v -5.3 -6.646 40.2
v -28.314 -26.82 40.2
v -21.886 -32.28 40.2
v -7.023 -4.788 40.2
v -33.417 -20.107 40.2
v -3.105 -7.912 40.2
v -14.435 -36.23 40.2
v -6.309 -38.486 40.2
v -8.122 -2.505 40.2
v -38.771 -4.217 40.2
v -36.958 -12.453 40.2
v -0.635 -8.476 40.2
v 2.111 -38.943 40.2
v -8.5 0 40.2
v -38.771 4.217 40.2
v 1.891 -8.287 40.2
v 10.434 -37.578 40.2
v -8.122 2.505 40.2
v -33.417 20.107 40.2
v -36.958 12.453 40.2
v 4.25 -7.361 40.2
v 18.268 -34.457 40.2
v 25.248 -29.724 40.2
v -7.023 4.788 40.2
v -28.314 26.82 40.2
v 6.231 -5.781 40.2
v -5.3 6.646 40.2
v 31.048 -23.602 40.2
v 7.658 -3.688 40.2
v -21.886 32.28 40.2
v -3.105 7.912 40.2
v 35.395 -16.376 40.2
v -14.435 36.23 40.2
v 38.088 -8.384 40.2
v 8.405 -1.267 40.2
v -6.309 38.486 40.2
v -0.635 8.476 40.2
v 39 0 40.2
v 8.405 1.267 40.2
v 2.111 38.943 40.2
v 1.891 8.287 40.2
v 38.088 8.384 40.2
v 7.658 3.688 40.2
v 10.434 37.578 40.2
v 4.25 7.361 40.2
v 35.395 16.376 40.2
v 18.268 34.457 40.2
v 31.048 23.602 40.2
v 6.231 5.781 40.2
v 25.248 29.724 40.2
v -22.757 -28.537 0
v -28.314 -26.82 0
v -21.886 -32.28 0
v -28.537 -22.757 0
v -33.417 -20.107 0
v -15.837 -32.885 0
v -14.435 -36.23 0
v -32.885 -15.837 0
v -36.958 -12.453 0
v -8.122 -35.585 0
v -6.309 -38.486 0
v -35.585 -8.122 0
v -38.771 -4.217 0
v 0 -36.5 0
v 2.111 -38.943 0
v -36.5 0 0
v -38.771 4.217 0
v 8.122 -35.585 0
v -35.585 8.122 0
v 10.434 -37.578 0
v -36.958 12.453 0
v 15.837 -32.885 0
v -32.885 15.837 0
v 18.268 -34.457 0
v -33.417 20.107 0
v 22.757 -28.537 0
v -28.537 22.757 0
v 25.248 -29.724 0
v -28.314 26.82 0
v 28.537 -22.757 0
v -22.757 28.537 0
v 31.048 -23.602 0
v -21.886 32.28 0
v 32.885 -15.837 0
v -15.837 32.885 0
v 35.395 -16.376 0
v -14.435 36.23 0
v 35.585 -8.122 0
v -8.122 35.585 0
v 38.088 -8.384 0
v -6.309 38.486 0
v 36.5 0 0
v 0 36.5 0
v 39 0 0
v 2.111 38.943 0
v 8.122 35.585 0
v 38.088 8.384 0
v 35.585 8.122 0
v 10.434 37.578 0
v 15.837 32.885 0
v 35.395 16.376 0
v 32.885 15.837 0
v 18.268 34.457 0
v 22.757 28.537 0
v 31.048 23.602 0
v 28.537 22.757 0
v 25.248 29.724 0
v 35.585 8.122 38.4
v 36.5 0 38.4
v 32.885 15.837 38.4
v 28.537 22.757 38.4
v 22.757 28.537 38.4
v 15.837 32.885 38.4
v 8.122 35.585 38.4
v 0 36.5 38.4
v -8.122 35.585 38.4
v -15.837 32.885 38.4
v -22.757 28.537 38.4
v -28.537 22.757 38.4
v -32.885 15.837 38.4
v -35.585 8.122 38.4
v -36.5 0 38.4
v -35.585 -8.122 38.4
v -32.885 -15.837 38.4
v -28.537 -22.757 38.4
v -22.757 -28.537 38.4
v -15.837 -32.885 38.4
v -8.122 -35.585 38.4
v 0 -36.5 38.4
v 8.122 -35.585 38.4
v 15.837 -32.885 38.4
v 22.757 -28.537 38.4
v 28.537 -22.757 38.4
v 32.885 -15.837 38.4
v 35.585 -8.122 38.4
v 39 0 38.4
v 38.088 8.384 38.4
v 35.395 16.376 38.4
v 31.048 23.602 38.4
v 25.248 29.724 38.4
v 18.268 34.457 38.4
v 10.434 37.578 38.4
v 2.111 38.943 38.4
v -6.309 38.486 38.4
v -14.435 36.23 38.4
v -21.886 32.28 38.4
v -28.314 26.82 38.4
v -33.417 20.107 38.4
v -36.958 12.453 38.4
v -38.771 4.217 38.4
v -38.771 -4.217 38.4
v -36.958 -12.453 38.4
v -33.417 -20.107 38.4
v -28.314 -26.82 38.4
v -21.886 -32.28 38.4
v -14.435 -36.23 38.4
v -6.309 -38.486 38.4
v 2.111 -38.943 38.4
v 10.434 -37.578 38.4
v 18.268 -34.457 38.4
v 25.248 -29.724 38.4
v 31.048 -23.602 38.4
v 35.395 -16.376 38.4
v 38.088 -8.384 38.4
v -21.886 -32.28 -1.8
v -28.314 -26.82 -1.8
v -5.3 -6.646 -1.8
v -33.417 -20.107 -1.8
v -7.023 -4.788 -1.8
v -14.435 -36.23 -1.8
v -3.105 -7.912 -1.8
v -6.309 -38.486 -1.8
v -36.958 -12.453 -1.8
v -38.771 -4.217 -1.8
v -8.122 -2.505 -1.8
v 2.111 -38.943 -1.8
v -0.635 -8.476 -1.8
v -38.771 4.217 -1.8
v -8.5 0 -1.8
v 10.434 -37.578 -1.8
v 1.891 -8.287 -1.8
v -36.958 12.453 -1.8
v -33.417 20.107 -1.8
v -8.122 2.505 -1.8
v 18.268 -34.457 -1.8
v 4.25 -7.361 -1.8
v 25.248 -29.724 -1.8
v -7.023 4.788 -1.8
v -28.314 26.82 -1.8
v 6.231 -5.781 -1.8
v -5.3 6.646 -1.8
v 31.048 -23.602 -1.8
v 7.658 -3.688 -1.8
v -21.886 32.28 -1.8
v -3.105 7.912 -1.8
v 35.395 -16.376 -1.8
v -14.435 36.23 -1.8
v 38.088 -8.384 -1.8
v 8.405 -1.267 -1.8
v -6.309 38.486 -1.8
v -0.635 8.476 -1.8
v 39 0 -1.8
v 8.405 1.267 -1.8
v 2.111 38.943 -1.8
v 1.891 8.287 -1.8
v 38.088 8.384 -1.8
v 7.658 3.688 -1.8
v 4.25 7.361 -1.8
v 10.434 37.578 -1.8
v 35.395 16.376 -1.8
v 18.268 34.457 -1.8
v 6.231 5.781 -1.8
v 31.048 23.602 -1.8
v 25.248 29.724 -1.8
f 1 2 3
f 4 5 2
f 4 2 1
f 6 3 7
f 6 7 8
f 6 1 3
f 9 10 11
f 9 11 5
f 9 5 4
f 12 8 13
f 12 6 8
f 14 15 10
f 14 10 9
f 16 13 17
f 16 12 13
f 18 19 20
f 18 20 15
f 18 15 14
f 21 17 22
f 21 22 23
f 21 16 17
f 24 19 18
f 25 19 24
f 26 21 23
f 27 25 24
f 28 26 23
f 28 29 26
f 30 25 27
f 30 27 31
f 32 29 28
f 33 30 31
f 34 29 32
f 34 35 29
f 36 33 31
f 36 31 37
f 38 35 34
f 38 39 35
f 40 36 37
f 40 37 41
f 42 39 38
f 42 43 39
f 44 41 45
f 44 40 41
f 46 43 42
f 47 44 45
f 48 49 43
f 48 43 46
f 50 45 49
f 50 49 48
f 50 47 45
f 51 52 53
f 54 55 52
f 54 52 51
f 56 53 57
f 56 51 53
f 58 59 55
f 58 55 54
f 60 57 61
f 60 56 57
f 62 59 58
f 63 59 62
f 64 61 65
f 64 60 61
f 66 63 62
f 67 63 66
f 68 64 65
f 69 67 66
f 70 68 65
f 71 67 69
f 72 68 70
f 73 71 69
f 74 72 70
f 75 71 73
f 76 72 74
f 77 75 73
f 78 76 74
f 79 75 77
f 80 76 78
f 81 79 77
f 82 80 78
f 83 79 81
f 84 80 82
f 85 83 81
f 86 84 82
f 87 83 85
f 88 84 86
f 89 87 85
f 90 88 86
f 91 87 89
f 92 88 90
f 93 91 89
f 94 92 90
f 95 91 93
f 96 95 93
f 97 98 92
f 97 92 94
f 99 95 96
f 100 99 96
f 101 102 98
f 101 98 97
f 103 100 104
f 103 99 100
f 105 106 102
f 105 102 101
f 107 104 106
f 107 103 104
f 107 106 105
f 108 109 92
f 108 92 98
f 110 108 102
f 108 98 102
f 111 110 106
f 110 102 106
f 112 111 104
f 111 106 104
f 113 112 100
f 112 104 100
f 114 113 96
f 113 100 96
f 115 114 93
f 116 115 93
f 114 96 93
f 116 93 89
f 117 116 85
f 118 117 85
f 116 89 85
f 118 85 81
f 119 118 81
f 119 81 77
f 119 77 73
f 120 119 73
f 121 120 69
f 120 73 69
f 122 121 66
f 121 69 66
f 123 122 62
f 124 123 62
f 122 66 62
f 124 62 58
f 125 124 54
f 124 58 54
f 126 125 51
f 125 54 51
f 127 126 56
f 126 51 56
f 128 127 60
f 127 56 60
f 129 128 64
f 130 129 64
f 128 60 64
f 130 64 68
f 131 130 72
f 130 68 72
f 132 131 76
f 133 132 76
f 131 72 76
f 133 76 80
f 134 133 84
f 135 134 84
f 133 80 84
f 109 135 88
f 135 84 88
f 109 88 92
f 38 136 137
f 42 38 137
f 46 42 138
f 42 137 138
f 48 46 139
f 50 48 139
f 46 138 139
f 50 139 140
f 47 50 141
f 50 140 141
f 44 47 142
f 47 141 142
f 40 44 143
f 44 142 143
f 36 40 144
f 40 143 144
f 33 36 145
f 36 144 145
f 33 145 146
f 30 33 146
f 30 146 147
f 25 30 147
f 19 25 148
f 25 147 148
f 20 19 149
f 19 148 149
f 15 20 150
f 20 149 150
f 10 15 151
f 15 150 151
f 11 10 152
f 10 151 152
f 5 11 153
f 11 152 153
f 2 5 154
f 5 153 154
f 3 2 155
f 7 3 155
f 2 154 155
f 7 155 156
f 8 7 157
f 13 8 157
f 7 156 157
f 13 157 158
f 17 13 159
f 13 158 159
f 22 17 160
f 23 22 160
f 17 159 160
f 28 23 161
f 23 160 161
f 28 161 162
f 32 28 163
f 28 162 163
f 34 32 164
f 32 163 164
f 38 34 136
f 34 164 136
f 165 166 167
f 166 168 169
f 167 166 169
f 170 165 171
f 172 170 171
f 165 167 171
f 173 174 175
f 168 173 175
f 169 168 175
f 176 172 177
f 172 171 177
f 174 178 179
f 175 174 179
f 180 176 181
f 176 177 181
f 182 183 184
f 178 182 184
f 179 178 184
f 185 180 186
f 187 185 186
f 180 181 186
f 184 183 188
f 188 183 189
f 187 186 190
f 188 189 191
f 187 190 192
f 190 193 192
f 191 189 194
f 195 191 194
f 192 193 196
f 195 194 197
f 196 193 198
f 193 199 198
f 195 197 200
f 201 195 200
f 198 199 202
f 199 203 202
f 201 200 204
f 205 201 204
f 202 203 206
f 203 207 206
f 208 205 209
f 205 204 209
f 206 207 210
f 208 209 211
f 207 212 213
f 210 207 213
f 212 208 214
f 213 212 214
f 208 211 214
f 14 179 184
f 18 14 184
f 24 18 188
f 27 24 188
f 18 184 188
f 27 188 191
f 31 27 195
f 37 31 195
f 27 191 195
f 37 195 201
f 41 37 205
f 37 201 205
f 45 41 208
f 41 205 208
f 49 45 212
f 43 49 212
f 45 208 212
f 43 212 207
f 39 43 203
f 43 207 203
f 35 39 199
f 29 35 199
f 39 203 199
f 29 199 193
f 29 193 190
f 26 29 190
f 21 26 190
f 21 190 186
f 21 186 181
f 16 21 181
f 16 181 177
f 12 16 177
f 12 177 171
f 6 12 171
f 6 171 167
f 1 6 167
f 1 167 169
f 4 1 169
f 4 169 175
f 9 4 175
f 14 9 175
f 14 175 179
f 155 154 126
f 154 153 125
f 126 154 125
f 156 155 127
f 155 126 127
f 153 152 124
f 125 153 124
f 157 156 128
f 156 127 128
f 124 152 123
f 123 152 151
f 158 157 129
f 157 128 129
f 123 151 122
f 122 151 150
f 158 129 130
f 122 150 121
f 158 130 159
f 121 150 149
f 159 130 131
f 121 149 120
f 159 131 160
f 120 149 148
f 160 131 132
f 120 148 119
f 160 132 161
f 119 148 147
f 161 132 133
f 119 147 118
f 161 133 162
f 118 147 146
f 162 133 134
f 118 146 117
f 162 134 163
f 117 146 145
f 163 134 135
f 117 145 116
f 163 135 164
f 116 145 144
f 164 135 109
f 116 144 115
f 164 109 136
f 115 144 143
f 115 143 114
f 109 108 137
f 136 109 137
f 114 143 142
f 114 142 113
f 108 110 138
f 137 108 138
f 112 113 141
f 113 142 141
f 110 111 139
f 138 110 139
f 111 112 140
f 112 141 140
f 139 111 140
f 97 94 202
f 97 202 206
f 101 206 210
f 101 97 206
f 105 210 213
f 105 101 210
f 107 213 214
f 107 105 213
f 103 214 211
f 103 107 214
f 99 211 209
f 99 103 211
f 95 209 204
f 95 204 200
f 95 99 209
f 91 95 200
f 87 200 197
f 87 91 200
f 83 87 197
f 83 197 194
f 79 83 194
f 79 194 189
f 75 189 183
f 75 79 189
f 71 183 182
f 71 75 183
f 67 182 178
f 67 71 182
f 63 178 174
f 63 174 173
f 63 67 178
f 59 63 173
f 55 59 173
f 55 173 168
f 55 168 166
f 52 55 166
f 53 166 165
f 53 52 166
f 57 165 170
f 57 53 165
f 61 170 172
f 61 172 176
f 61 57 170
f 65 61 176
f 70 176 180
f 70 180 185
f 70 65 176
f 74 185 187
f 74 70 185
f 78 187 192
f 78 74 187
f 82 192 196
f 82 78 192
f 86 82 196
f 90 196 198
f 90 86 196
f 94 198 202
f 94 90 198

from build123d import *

# Parameters (mm, degrees)
CROQUIS1_R              = 36.5
SALIENTE_EXTRUIR1_DEPTH = 38.4
CROQUIS2_R              = 39
SALIENTE_EXTRUIR2_DEPTH = 1.8
CROQUIS3_R              = 8.5
CORTAR_EXTRUIR1_DEPTH   = 43


with BuildPart() as part:
    # Croquis1 → Saliente-Extruir1 (new body)
    with BuildSketch(Plane.XY):
        Circle(CROQUIS1_R)
    extrude(amount=SALIENTE_EXTRUIR1_DEPTH)

    # Croquis2 → Saliente-Extruir2 (add)
    with BuildSketch(Plane.XY.offset(38.4)):
        Circle(CROQUIS2_R)
    saliente_extruir2 = extrude(amount=SALIENTE_EXTRUIR2_DEPTH)

    # Simetría1: Saliente-Extruir2 across plane
    add(saliente_extruir2.mirror(Plane(origin=(0, 0, 19.2), x_dir=(1, 0, 0), z_dir=(0, 0, -1))))

    # Croquis3 → Cortar-Extruir1 (cut, through all)
    with BuildSketch(Plane(origin=(0, 0, -1.8), x_dir=(-1, 0, 0), z_dir=(0, 0, -1))):
        Circle(CROQUIS3_R)
    extrude(amount=-CORTAR_EXTRUIR1_DEPTH, mode=Mode.SUBTRACT)


solid = part.part
